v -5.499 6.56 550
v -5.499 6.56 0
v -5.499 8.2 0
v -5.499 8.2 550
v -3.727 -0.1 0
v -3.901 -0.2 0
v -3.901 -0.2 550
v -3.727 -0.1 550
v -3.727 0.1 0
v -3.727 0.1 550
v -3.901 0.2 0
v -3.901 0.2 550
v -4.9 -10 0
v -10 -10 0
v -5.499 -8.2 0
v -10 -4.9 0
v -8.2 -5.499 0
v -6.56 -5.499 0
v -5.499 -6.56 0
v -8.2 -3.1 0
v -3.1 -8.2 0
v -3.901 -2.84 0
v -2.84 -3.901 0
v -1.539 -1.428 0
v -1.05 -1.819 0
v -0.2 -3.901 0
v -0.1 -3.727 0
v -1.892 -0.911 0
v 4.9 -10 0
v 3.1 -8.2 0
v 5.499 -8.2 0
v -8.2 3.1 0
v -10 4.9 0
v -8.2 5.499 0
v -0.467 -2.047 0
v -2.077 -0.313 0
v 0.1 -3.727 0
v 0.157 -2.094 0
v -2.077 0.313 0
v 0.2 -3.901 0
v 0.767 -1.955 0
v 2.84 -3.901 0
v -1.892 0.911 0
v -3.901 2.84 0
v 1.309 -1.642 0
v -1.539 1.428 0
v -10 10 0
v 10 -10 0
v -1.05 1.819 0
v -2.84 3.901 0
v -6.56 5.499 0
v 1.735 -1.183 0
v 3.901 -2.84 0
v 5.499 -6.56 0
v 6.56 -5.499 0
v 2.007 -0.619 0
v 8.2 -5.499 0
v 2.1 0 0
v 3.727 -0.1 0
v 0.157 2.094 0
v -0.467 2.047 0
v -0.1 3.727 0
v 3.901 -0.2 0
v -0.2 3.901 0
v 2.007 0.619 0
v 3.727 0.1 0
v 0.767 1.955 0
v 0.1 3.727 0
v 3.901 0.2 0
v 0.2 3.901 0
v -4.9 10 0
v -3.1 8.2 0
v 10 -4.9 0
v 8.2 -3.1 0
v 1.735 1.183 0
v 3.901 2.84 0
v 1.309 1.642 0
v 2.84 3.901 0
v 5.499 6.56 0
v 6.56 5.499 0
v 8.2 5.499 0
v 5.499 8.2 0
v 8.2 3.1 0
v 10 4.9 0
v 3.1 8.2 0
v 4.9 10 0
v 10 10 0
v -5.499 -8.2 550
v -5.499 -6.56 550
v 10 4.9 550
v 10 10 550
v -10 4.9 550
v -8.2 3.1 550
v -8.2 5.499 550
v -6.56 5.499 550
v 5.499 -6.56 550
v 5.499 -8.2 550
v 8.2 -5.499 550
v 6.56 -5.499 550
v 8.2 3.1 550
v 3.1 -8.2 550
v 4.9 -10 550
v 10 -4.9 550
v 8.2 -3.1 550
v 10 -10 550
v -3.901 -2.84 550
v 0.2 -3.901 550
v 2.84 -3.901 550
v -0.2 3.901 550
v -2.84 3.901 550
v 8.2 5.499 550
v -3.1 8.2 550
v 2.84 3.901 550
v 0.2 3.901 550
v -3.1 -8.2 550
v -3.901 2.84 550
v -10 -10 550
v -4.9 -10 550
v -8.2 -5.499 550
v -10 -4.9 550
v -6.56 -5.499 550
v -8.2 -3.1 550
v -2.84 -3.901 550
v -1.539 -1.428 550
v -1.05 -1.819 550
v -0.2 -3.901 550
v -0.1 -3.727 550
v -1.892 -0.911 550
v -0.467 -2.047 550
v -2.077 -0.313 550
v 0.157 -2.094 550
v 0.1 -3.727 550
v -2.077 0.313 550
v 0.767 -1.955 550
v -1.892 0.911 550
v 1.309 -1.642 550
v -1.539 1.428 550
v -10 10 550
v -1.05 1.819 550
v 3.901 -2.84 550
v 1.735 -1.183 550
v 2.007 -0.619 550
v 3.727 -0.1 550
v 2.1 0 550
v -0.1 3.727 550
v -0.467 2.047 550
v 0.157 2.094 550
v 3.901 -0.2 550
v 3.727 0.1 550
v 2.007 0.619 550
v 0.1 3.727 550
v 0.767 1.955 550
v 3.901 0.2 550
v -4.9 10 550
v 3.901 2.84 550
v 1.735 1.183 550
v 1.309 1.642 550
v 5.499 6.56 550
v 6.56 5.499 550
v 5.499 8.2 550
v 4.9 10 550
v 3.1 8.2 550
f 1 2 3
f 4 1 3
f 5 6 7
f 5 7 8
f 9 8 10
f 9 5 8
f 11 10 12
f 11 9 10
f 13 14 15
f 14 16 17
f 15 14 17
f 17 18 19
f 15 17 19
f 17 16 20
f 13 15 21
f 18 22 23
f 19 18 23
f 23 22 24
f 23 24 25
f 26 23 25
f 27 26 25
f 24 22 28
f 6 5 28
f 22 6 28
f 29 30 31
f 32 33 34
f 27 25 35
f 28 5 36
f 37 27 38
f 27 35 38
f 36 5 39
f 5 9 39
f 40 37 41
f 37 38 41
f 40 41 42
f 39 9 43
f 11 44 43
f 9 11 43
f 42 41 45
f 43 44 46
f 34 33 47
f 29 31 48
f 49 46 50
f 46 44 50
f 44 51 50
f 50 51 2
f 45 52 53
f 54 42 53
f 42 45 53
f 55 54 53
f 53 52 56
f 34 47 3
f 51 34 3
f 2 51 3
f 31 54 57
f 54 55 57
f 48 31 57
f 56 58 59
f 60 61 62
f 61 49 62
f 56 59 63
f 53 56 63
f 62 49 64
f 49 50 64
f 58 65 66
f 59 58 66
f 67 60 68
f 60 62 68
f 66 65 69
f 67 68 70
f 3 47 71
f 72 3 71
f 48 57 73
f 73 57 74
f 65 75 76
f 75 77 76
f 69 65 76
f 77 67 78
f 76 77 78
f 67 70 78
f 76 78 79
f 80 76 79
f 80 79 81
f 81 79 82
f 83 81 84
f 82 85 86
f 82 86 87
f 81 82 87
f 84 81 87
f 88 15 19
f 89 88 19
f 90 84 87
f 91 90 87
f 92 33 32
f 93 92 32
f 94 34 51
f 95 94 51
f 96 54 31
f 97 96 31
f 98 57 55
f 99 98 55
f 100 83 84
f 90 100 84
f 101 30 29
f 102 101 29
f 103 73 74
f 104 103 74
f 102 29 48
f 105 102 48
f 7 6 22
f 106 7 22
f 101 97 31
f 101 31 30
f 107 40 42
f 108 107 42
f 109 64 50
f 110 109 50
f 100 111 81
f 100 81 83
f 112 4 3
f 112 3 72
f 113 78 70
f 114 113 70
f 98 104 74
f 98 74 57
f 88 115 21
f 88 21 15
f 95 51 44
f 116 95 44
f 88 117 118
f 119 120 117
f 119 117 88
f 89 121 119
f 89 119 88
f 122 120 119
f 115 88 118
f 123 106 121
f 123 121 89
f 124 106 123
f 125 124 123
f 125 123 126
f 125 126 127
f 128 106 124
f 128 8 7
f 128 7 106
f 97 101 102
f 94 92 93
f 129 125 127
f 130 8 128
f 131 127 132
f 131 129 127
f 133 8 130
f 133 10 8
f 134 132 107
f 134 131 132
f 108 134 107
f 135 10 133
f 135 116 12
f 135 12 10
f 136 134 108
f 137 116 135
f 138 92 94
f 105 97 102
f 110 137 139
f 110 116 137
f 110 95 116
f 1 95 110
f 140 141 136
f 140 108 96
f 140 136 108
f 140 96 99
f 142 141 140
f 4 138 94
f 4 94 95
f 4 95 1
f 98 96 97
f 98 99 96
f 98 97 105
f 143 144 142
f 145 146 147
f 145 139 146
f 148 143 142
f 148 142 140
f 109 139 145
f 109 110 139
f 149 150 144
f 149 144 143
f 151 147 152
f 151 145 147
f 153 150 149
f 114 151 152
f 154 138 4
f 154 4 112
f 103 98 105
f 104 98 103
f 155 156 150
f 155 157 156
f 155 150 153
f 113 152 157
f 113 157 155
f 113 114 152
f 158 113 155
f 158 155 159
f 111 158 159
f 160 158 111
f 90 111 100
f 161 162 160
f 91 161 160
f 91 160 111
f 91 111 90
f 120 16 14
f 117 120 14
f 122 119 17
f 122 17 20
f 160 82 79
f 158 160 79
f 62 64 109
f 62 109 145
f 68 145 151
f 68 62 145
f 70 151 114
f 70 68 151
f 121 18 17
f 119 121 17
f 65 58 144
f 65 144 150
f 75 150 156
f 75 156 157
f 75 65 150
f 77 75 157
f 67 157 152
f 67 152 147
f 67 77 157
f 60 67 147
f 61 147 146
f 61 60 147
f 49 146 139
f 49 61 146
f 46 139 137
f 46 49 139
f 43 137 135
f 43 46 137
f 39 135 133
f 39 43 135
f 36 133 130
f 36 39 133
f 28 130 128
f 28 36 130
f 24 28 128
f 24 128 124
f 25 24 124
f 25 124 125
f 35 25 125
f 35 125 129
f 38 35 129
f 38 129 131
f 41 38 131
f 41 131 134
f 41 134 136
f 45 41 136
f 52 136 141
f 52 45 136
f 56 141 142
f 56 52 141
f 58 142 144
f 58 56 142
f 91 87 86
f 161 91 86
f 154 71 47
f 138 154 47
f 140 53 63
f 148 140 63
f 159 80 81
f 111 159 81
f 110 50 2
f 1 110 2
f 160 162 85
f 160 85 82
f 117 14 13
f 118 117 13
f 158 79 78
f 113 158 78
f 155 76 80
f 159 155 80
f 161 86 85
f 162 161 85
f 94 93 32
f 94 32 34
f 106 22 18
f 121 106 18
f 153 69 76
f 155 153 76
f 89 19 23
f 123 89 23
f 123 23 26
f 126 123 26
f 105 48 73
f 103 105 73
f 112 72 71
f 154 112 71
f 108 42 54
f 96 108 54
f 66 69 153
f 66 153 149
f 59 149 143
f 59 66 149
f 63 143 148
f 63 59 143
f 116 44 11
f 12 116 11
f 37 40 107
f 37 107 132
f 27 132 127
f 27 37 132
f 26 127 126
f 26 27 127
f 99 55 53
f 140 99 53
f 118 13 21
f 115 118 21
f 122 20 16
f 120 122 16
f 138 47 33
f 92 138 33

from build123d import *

# Parameters (mm, degrees)
SKETCH1_R           = 2.1
BOSS_EXTRUDE1_DEPTH = 550
CUT_EXTRUDE1_DEPTH  = 550


# Read off the part's stored shape, not the designer's step: Cut-Extrude1
with BuildPart() as part:
    # Sketch1 → Boss-Extrude1 (new body)
    with BuildSketch(Plane.XY):
        Polygon((-10, -4.9), (-10, -10), (-4.9, -10), (-3.1, -8.2), (-5.499339828, -8.2), (-5.499339828, -6.56), (-2.84, -3.900660172), (2.84, -3.900660172), (5.499339828, -6.56), (5.499339828, -8.2), (3.1, -8.2), (4.9, -10), (10, -10), (10, -4.9), (8.2, -3.1), (8.2, -5.499339828), (6.56, -5.499339828), (3.900660172, -2.84), (3.900660172, 2.84), (6.56, 5.499339828), (8.2, 5.499339828), (8.2, 3.1), (10, 4.9), (10, 10), (4.9, 10), (3.1, 8.2), (5.499339828, 8.2), (5.499339828, 6.56), (2.84, 3.900660172), (-2.84, 3.900660172), (-5.499339828, 6.56), (-5.499339828, 8.2), (-3.1, 8.2), (-4.9, 10), (-10, 10), (-10, 4.9), (-8.2, 3.1), (-8.2, 5.499339828), (-6.56, 5.499339828), (-3.900660172, 2.84), (-3.900660172, -2.84), (-6.56, -5.499339828), (-8.2, -5.499339828), (-8.2, -3.1), align=None)
        Circle(SKETCH1_R, mode=Mode.SUBTRACT)
    extrude(amount=BOSS_EXTRUDE1_DEPTH)

    # Cut-Extrude1 outline → Cut-Extrude1 (cut)
    with BuildSketch(Plane.XY):
        with BuildLine():
            ThreePointArc((-3.900660172, -0.2), (-3.700660172, 0), (-3.900660172, 0.2))
            Line((-3.900660172, 0.2), (-3.900660172, -0.2))
        make_face()
        with BuildLine():
            ThreePointArc((-0.2, 3.900660172), (0, 3.700660172), (0.2, 3.900660172))
            Line((0.2, 3.900660172), (-0.2, 3.900660172))
        make_face()
        with BuildLine():
            ThreePointArc((3.900660172, 0.2), (3.700660172, 0), (3.900660172, -0.2))
            Line((3.900660172, -0.2), (3.900660172, 0.2))
        make_face()
        with BuildLine():
            ThreePointArc((0.2, -3.900660172), (0, -3.700660172), (-0.2, -3.900660172))
            Line((-0.2, -3.900660172), (0.2, -3.900660172))
        make_face()
    extrude(amount=CUT_EXTRUDE1_DEPTH, mode=Mode.SUBTRACT)


solid = part.part
